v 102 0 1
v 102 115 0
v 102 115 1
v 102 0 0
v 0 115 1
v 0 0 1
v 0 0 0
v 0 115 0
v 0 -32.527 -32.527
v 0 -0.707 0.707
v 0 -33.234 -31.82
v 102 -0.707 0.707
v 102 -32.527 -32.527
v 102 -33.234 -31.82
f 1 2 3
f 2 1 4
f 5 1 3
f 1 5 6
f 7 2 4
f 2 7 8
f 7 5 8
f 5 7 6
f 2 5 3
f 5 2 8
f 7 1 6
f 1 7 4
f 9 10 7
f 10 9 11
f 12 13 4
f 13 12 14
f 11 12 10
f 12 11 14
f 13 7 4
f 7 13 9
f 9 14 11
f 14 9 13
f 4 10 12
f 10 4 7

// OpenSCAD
// Retract | Back | Extrude | Up   | Cool | Pause |
// Left    | Fwd  | Right   | Down | Heat | Home  |
// D | B | U | E | H
// L | F | R | T | C

screen_w = 102;
screen_d = 115;
screen_bend_d = 46;
screen_bend_a = 45; // Need to measure this

cube([screen_w, screen_d, 1]);

rotate([screen_bend_a, 0, 0])
translate([0, -screen_bend_d, 0])
cube([screen_w, screen_bend_d, 1]);










// Home all axes:
// M300 S100 P20 ;quick beep to confirm button press (delete if you find it irritating)
// G28
//
// My unload filament script for TriangleLabs DDE: (if you have ADVANCED_PAUSE_FEATURE enabled in marlin you can use M702)
// M300 S100 P20 ;quick beep to confirm button press (delete if you find it irritating)
// G21
// G90
// G92 E0
// G1 E10 F100 ;extrude a little bit slowly to prevent blob forming (change Exxx for your lenght)
// G92 E0
// G1 E-120 F2000 ;quickly unload the filament (change E-xxx for your lenght)
// G92 E0
// M400
//
// My load filament script for TriangleLabs DDE: (if you have ADVANCED_PAUSE_FEATURE enabled in marlin you can use M701)
// M300 S100 P20 ;quick beep to confirm button press (delete if you find it irritating)
// G21
// G90
// G4 S5
// G92 E0
// G1 E80 F2000 ;quickly insert the filament untill the hotzone (change Exxx for your lenght)
// G92 E0
// G1 E40 F200 ;slowly insert the filament into the hotzone and extrude a little bit more to prime it (change Exxx for your lenght)
// G92 E0
// M400
//
// Preheat nozzle to 200C script:
// M300 S100 P20 ;quick beep to confirm button press (delete if you find it irritating)
// M104 S200 T0 ;change Sxxx for your temperature
//
// Preheat bed to 60C script:
// M300 S100 P20 ;quick beep to confirm button press (delete if you find it irritating)
// M140 S60 ;change Sxxx for your temperature
//
// Cooldown E and Bed:
// M300 S100 P20 ;quick beep to confirm button press (delete if you find it irritating)
// M104 S0; Set Hot-end to 0C (off)
// M140 S0; Set bed to 0C (off)
//
// Disable steppers:
// M300 S100 P20 ;quick beep to confirm button press (delete if you find it irritating)
// M18
//
// Pause print (!YOU NEED ADVANCED_PAUSE_FEATURE IN MARLIN FIRMWARE!):
// M300 S100 P20 ;quick beep to confirm button press (delete if you find it irritating)
// M125
//
// Change Filament (!YOU NEED ADVANCED_PAUSE_FEATURE IN MARLIN FIRMWARE!):
// M300 S100 P20 ;quick beep to confirm button press (delete if you find it irritating)
// M600
